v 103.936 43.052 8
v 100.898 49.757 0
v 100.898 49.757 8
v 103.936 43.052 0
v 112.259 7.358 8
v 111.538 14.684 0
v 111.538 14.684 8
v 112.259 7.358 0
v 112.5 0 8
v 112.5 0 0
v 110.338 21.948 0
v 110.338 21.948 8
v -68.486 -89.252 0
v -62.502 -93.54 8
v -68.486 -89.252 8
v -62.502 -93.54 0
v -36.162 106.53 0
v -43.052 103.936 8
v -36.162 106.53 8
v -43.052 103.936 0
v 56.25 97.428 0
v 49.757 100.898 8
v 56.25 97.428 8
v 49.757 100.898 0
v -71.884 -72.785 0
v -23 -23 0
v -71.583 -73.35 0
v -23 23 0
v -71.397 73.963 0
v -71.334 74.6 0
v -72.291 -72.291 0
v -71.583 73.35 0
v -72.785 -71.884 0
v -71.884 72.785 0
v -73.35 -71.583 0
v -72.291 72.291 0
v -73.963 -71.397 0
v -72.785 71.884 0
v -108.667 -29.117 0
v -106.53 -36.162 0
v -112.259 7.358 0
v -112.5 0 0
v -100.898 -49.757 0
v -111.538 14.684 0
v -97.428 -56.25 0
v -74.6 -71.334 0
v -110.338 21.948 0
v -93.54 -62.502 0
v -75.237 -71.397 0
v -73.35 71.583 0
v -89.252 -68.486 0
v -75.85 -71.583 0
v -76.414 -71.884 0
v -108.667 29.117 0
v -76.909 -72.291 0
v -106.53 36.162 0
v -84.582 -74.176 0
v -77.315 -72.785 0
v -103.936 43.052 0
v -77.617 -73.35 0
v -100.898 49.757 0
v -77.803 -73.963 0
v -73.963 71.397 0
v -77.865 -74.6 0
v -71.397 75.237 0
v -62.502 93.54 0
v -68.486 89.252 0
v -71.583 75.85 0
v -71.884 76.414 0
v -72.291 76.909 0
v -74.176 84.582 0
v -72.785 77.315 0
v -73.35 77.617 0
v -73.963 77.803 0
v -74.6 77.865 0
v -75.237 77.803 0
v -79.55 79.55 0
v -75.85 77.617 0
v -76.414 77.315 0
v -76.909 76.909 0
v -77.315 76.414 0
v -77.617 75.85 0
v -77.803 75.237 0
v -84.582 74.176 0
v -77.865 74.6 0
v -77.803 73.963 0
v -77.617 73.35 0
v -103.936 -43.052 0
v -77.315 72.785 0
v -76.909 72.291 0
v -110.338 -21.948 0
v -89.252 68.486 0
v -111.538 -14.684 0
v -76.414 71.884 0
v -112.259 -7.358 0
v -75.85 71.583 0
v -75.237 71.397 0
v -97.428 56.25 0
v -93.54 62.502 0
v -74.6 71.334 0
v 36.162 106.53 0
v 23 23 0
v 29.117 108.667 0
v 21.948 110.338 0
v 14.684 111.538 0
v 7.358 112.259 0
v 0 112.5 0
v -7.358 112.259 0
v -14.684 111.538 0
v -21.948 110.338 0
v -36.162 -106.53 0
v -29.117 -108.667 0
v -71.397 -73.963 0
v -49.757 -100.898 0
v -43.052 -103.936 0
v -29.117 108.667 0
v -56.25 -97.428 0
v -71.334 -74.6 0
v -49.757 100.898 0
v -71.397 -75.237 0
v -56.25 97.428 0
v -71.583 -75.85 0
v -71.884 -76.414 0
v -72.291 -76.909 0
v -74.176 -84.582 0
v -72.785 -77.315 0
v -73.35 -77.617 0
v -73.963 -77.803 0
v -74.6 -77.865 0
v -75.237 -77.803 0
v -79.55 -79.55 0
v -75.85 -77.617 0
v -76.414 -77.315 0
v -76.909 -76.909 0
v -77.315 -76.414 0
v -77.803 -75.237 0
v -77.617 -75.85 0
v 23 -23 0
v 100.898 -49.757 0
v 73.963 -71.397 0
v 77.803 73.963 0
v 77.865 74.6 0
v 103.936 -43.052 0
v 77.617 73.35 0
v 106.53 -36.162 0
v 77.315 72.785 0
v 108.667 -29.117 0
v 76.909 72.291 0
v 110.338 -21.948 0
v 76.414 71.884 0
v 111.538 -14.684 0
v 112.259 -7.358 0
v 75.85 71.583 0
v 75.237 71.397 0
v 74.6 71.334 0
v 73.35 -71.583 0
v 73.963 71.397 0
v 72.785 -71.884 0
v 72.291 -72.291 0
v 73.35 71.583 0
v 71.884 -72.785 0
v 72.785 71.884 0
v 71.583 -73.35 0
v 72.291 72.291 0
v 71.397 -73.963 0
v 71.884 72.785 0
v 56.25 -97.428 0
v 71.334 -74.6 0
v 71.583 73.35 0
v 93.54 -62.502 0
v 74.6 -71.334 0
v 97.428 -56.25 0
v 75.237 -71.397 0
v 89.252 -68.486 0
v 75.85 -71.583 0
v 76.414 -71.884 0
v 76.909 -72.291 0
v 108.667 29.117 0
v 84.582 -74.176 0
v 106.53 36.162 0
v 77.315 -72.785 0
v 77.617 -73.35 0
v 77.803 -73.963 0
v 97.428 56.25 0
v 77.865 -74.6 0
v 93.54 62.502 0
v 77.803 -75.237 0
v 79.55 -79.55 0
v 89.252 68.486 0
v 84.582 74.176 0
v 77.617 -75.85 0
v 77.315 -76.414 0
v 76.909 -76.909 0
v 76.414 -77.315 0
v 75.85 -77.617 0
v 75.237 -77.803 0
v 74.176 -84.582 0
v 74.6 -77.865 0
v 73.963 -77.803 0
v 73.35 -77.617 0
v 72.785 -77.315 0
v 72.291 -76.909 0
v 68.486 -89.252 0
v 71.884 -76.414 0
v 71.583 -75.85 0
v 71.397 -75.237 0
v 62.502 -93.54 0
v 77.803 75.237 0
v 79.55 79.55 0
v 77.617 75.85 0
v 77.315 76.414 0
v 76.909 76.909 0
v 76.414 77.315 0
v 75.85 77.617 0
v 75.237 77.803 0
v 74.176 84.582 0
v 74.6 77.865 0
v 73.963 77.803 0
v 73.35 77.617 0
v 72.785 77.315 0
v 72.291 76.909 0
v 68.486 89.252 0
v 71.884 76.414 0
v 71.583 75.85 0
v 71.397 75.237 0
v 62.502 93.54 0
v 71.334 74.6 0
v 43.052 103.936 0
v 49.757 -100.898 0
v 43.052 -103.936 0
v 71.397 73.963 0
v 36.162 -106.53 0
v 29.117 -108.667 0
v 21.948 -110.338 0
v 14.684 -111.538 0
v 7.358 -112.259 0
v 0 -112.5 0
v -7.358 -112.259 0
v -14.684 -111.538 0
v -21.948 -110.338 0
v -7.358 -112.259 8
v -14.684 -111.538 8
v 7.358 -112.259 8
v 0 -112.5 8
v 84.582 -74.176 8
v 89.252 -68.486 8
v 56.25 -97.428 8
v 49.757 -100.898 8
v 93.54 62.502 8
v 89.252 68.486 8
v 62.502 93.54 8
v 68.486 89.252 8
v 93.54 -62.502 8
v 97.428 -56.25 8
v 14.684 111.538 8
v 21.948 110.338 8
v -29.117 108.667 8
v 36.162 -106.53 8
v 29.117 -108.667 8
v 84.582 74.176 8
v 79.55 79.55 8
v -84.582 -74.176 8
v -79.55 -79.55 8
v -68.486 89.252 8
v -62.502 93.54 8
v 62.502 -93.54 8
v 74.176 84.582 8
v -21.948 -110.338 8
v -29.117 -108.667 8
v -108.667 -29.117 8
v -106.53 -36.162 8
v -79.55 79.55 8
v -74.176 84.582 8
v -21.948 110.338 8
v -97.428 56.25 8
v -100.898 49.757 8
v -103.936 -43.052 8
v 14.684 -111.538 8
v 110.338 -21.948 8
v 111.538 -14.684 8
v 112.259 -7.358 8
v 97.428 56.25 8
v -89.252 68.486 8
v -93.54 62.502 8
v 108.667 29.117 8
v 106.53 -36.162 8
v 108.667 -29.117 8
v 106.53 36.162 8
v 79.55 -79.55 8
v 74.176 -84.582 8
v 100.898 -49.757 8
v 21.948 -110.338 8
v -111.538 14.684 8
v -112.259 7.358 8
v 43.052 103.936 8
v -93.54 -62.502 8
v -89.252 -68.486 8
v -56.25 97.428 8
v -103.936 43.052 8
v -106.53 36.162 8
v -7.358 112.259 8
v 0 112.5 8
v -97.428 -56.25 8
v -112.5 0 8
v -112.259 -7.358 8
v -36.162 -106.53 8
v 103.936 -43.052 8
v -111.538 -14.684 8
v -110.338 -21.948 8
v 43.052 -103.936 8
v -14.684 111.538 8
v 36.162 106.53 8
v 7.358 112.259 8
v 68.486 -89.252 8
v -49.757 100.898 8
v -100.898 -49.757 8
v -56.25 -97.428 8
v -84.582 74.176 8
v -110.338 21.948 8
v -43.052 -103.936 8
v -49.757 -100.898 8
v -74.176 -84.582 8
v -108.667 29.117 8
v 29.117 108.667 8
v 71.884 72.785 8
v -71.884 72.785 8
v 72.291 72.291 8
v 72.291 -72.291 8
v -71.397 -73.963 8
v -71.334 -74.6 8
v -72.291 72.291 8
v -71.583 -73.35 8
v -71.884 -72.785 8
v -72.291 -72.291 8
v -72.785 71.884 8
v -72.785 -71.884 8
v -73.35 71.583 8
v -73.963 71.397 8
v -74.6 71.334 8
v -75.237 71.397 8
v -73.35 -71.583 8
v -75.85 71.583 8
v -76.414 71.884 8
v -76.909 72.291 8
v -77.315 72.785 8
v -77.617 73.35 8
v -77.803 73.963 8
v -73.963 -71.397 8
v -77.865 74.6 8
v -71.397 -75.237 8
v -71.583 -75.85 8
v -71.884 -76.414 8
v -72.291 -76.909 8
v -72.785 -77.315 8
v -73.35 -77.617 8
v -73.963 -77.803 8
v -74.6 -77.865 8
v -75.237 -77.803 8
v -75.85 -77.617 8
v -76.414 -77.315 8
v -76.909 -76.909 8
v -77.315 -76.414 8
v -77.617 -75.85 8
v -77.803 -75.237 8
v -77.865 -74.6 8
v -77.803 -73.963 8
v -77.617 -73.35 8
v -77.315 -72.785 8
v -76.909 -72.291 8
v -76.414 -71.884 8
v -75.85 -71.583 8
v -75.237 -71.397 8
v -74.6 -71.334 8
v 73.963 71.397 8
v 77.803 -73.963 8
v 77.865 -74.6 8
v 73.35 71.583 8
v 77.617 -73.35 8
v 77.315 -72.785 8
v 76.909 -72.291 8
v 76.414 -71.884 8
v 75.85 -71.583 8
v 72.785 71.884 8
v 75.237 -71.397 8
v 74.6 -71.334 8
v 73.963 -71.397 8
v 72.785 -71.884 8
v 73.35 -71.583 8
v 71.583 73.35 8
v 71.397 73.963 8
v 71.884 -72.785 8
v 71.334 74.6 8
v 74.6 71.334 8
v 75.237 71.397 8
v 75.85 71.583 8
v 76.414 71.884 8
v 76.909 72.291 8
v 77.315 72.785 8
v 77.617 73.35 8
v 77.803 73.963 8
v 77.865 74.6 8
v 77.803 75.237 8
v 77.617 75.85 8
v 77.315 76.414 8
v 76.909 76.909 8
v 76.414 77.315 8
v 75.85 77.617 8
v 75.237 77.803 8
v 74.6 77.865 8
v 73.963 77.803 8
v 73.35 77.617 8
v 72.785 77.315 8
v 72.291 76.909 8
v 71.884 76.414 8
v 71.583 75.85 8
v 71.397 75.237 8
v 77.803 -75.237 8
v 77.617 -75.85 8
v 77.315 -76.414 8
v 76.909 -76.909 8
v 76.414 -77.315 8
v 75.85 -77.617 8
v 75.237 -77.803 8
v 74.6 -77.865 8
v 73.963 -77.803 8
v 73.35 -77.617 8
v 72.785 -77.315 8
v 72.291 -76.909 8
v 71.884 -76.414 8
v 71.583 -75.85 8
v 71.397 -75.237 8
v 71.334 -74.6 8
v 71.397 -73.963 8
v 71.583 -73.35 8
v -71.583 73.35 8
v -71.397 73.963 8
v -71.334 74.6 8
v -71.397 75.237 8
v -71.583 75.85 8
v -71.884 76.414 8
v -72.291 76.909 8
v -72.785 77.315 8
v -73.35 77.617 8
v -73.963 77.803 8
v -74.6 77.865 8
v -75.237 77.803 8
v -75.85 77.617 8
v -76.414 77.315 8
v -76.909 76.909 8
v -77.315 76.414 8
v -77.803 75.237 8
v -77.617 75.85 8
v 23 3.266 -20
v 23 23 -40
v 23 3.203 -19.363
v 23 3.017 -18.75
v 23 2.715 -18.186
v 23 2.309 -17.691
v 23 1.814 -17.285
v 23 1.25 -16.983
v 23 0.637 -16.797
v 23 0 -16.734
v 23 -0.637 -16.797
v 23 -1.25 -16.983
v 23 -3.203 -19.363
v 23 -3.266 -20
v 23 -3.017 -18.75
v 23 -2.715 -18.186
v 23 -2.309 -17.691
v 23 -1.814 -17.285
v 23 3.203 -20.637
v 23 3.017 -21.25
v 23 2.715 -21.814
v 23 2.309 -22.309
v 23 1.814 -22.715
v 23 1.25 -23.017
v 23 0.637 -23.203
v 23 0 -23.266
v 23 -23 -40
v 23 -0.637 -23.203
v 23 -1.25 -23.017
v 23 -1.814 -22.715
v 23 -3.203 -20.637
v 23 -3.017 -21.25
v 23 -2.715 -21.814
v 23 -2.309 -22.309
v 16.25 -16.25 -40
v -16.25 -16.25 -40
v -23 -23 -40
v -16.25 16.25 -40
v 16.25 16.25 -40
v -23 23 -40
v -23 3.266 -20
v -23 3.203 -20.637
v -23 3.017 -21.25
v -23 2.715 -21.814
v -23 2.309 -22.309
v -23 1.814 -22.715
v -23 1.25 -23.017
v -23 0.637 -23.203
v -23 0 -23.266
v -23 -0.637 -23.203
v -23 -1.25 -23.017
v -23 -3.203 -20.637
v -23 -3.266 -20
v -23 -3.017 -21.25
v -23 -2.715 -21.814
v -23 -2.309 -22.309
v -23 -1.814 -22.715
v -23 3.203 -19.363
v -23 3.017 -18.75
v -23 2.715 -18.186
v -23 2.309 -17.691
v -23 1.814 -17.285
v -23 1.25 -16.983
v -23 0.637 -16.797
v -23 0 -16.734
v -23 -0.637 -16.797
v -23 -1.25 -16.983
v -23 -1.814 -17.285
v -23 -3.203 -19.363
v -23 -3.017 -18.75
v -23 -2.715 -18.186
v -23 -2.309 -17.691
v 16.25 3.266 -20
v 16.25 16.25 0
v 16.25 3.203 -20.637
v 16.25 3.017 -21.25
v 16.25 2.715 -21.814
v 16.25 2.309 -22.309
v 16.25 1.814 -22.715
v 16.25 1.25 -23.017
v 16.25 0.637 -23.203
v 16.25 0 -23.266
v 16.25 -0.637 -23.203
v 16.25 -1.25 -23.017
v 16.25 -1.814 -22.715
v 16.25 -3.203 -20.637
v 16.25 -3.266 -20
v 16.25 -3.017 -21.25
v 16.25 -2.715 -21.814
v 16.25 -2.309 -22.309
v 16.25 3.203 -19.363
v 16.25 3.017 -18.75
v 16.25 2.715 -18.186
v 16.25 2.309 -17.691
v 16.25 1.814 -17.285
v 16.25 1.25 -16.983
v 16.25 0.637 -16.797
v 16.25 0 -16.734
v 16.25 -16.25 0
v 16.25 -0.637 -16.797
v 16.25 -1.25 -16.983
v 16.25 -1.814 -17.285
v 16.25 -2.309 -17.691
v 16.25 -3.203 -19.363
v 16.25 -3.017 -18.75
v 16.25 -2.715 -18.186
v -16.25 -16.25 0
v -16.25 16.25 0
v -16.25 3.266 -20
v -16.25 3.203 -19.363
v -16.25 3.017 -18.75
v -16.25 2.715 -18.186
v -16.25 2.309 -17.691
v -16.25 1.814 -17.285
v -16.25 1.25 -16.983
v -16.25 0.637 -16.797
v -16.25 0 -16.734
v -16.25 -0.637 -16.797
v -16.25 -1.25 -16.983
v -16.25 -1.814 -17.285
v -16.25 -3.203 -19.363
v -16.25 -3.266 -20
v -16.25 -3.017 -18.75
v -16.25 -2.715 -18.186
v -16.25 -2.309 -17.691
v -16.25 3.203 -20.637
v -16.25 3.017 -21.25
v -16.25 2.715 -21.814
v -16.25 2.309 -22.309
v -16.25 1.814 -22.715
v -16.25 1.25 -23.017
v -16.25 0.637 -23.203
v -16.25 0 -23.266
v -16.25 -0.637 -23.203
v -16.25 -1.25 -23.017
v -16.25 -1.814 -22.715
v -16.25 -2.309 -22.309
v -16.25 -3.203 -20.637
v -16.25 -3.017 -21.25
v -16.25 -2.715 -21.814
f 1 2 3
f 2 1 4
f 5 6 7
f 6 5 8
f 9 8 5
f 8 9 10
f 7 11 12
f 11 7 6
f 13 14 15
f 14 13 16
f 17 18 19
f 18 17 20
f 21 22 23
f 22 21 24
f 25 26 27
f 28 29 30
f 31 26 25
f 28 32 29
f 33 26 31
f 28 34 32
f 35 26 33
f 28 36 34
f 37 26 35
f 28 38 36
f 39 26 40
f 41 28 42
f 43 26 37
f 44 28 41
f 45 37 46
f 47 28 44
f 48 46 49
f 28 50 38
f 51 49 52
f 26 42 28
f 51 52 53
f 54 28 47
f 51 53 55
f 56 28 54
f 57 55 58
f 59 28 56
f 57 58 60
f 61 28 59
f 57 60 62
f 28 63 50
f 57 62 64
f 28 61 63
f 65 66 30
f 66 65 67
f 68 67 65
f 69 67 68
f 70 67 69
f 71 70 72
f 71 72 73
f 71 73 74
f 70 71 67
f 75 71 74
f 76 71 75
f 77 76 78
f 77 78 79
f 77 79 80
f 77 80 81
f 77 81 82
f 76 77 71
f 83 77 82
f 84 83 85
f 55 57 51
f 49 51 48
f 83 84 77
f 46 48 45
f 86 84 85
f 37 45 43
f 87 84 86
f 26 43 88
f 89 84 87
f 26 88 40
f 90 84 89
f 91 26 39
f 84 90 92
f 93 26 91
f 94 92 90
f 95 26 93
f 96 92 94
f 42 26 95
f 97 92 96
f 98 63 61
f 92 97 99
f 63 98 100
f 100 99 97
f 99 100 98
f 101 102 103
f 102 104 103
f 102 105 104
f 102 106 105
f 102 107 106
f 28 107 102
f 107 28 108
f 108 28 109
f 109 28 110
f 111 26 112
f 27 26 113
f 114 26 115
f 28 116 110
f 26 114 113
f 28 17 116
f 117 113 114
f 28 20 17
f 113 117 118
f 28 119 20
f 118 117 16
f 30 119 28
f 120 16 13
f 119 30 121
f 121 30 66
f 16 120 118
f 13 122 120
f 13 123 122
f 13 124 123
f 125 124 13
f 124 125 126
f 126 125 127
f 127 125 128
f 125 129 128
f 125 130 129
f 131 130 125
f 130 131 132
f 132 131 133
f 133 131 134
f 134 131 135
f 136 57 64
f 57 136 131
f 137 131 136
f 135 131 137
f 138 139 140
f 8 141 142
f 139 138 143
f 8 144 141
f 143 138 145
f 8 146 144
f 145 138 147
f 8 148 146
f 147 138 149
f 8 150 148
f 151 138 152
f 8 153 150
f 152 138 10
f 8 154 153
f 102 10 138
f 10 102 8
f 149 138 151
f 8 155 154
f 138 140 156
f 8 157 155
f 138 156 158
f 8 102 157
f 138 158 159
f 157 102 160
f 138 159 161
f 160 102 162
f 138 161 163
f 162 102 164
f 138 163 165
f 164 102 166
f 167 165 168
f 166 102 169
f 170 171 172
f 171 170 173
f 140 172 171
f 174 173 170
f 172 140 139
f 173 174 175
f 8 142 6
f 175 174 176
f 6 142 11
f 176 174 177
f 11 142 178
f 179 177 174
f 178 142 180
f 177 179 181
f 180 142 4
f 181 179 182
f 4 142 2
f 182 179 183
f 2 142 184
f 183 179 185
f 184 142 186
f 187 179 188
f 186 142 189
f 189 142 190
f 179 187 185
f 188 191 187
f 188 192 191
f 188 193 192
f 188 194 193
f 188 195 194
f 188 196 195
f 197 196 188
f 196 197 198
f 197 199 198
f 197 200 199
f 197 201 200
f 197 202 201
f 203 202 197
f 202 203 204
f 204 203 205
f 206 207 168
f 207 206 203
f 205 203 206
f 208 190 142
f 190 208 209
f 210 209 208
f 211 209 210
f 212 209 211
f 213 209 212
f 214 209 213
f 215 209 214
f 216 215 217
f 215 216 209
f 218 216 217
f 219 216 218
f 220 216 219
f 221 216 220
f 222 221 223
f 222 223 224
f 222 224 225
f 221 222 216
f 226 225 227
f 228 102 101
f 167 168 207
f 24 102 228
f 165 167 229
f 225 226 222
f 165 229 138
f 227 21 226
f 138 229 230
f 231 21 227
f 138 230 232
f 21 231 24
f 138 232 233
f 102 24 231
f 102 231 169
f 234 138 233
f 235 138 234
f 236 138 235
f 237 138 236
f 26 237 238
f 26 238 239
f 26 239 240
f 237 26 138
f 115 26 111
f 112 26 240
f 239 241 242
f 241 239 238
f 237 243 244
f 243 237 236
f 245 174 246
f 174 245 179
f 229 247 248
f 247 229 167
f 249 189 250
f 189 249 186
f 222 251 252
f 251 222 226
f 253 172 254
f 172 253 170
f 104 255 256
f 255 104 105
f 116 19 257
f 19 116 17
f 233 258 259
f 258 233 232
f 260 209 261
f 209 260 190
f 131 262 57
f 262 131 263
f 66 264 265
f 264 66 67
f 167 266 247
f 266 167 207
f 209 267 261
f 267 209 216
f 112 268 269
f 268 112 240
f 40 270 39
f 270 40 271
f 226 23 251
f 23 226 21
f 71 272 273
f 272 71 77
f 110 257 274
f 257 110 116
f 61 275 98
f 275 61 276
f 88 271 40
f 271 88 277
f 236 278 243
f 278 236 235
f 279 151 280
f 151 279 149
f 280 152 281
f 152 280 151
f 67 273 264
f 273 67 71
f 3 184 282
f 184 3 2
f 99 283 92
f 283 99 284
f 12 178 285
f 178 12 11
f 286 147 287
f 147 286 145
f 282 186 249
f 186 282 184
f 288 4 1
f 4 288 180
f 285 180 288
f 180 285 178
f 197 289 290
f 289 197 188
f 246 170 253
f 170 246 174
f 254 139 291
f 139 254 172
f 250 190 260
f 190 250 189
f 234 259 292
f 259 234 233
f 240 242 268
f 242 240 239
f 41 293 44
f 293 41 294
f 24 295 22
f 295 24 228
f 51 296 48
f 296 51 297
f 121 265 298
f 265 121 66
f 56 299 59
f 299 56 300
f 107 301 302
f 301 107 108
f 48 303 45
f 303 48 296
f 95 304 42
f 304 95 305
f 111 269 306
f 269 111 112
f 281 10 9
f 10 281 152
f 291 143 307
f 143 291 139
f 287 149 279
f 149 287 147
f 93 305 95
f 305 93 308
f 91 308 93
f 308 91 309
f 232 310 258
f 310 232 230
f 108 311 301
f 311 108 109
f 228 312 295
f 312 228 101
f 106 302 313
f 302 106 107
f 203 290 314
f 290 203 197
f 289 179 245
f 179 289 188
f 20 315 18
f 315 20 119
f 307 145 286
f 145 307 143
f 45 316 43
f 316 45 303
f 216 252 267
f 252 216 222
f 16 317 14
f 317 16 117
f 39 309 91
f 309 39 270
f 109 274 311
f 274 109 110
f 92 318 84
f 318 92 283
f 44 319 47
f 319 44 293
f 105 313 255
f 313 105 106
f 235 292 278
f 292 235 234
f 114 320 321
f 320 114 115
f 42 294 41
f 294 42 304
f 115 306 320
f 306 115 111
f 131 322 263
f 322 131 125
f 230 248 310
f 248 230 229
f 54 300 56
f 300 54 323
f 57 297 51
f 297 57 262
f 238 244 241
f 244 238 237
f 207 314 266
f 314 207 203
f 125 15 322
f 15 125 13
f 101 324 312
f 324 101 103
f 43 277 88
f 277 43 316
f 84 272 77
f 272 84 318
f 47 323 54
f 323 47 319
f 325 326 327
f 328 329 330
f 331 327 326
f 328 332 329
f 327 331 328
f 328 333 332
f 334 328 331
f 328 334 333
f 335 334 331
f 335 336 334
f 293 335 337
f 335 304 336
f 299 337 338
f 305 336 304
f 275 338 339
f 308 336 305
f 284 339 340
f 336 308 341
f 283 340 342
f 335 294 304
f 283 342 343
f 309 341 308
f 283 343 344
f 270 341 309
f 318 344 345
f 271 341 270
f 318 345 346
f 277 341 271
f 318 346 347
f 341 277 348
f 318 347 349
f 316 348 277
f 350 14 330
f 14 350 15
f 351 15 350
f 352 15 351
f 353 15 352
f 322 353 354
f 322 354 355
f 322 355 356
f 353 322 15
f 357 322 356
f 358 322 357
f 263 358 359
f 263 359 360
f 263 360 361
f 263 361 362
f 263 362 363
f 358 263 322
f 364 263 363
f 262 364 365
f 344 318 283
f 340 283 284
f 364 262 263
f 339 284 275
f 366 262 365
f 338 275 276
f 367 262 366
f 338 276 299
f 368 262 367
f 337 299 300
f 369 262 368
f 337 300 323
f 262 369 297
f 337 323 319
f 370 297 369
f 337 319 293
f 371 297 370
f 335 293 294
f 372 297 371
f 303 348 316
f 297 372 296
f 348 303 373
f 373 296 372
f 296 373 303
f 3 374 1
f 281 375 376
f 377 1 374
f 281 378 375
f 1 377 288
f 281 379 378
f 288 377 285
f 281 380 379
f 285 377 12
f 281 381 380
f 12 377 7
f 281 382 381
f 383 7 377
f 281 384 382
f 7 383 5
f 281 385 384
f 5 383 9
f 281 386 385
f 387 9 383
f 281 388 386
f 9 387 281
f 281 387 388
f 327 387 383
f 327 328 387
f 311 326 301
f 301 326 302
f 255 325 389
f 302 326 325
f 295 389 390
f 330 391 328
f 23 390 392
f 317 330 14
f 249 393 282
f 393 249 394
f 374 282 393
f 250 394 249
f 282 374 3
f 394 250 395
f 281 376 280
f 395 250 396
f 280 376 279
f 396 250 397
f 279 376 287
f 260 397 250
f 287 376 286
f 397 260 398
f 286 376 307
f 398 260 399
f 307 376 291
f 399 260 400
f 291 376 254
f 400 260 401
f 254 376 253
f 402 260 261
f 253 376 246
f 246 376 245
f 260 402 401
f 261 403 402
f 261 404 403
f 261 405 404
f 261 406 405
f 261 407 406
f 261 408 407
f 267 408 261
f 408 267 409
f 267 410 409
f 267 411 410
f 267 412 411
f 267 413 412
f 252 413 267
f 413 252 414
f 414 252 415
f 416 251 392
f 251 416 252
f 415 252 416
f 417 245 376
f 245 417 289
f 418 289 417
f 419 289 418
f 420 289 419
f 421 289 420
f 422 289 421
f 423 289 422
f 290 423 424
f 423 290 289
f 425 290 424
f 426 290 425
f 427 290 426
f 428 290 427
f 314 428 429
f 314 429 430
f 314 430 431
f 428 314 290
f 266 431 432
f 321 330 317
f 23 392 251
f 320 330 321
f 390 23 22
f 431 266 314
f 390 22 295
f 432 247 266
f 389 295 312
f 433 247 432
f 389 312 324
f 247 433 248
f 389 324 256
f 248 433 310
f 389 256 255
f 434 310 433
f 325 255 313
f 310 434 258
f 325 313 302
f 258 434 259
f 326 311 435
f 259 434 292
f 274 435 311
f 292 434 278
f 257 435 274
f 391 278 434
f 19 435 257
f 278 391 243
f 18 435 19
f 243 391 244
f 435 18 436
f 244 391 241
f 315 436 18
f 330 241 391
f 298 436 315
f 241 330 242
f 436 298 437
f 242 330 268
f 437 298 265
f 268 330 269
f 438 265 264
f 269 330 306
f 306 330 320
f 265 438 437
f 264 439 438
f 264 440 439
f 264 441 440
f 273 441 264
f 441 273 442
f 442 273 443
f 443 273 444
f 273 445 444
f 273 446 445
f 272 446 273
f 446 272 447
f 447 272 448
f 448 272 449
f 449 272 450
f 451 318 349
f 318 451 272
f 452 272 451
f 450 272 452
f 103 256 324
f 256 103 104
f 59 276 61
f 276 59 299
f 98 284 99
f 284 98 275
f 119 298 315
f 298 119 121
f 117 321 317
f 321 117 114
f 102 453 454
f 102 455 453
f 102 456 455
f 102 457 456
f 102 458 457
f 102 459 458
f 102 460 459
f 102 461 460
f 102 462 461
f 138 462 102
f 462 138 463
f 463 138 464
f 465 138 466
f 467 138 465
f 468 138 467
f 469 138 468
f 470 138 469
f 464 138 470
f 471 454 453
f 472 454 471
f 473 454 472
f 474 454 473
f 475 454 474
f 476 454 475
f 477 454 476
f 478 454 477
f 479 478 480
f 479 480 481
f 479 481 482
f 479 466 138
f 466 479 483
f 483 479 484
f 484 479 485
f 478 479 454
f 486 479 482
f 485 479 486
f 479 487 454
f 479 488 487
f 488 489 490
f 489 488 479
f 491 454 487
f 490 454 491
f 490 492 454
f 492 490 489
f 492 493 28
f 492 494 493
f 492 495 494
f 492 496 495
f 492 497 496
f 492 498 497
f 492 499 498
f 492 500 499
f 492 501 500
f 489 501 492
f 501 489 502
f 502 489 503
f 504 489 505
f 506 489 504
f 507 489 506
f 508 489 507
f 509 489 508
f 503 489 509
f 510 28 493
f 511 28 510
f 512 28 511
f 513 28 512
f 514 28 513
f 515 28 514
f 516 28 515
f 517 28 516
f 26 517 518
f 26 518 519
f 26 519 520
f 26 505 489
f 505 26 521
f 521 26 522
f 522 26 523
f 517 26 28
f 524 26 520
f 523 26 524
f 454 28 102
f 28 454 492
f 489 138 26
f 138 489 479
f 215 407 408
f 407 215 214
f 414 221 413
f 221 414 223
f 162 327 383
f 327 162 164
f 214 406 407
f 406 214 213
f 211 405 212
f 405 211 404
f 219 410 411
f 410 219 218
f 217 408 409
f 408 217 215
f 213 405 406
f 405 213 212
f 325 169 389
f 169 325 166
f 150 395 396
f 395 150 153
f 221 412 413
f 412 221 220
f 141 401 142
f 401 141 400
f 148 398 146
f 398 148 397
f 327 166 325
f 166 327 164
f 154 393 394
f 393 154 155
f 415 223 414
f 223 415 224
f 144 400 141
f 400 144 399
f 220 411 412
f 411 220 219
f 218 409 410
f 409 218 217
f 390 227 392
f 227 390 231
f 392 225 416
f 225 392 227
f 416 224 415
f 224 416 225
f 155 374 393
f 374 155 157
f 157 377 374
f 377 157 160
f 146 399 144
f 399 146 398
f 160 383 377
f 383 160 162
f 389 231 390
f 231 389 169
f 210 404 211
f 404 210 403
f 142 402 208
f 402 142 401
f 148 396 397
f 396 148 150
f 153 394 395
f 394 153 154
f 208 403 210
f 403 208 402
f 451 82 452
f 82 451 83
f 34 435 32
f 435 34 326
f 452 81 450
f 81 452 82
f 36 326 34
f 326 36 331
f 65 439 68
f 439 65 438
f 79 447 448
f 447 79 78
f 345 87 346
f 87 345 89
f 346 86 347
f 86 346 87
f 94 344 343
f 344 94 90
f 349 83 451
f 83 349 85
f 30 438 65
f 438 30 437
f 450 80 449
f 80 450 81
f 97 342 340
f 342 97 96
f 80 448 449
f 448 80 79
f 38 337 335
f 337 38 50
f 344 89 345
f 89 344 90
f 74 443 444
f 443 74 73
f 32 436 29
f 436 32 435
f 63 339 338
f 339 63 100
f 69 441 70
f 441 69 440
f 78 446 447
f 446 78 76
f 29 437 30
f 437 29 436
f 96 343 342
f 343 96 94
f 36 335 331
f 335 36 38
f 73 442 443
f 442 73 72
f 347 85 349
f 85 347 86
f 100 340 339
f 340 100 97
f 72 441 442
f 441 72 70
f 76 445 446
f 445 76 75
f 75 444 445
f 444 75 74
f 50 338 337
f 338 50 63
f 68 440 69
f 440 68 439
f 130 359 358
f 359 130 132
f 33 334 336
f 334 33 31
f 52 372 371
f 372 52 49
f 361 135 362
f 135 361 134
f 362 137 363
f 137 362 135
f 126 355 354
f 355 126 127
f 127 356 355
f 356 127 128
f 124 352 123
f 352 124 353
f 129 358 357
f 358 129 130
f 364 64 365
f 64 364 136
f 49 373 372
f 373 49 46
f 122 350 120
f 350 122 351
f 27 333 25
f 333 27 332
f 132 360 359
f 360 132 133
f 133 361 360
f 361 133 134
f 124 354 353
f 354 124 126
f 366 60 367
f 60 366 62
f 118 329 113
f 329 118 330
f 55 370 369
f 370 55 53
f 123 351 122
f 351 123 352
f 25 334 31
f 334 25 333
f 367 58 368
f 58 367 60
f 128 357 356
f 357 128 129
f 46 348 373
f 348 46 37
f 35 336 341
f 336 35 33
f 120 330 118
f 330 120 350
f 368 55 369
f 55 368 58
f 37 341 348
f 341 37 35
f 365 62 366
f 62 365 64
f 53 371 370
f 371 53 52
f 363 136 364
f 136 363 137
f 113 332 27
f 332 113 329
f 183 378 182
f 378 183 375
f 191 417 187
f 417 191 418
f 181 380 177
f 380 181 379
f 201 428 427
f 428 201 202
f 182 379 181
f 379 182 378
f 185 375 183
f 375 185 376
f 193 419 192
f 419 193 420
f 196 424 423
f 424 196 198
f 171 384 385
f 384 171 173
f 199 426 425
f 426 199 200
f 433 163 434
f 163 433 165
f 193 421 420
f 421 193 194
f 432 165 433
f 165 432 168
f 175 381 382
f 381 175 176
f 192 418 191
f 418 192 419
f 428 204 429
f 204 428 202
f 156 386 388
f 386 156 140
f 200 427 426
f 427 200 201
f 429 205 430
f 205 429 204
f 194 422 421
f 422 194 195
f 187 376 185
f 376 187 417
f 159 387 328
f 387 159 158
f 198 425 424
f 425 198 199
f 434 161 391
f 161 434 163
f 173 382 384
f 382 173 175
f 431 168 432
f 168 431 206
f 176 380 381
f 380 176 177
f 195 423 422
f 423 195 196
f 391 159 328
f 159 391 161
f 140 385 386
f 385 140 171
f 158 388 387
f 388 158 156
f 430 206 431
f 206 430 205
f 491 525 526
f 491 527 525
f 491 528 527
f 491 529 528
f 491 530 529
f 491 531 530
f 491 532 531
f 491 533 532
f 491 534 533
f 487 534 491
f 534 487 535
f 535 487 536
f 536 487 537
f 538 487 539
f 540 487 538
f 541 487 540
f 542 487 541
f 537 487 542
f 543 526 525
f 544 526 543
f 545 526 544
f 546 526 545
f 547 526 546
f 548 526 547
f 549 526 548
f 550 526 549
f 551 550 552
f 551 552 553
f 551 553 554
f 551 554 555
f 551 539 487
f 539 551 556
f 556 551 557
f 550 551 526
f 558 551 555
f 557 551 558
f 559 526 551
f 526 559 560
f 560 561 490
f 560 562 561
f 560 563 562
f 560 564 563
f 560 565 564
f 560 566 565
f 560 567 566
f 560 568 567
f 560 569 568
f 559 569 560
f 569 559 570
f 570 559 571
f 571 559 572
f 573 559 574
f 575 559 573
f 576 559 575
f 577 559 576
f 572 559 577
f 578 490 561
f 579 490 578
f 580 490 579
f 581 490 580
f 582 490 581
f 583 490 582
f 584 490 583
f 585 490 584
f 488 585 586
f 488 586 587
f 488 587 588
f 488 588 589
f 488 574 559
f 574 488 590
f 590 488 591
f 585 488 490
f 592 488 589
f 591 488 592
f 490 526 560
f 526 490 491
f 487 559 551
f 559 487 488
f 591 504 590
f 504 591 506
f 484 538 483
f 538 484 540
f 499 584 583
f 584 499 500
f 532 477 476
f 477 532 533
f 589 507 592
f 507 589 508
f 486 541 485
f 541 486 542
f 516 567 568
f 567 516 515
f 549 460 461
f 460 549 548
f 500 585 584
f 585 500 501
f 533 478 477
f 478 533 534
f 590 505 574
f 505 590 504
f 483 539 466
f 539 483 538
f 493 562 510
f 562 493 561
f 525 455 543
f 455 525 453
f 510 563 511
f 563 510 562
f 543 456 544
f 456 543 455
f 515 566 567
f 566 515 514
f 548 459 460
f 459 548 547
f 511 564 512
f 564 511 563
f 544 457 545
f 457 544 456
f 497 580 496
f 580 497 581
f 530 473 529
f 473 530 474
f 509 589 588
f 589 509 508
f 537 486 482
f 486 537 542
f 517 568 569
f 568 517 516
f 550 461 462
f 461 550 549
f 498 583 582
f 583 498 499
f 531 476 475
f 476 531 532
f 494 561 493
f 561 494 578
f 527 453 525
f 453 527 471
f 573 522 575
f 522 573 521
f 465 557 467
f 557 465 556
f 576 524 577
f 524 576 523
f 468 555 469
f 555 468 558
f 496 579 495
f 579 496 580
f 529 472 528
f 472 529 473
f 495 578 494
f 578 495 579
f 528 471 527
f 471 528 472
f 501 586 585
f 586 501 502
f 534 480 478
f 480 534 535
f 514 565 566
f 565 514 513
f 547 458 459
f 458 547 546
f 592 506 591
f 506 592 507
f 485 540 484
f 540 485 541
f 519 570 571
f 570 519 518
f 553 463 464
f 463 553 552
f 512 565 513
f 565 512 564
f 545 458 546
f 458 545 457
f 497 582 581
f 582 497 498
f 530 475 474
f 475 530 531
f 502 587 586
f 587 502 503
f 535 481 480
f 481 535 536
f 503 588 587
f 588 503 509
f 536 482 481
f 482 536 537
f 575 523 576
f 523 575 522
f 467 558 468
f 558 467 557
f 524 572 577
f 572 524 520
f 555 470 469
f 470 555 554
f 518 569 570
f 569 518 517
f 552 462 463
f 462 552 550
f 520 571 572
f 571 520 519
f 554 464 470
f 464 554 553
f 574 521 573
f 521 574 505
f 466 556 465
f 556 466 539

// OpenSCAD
// file: ../../../../../scad/lib/parent_spar_bolted.scad
// Parent modular exterior v2. mm. Geometry shared by individual part wrappers.
// Metal fasteners, ballast, Takachi box and electronics are purchased items.
/* [Dimensions] */
disk_d=225; disk_t=5;
fin_h=125; fin_w=65; fin_t=4;
beam_w=32; clearance=0.5;
float_r=100; flange_r=112.5; float_bore_r=30;
float_wall=4; float_h=180; lid_t=6;
rod_r=105.5; flange_t=6;
hub_h=32; root_x=30; root_depth=14;
$fn=96; e=0.03;
assert(disk_d<=225 && 2*flange_r<=225);
assert(fin_h>=100 && fin_h<=150 && fin_w>=50 && fin_w<=80);
assert(root_x+fin_w<disk_d/2-5);
module bore(d,h) { cylinder(d=d/cos(180/32),h=h,$fn=32); }
module bore_x(d,l) { rotate([0,90,0]) bore(d,l); }
module bore_y(d,l) { rotate([-90,0,0]) bore(d,l); }
module square_bore(h) { translate([-(beam_w+clearance)/2,-(beam_w+clearance)/2,-e]) cube([beam_w+clearance,beam_w+clearance,h+2*e]); }
module rods(h,d=6.5) { for(a=[45:90:315]) rotate([0,0,a]) translate([rod_r,0,-e]) bore(d,h+2*e); }
module lid_bolts(h) { for(a=[22.5:45:359]) rotate([0,0,a]) translate([rod_r,0,-e]) bore(4.5,h+2*e); }
module hub_pin(z) { translate([-46,10,z]) bore_x(6.5,92); }
module disk() {
 difference() { cylinder(d=disk_d,h=disk_t); square_bore(disk_t);
  for(x=[-23,23],y=[-23,23]) translate([x,y,-e]) bore(5.5,disk_t+2*e);
 }
}
module fin() {
 difference() { cube([fin_w,fin_t,fin_h]);
  for(z=[10,fin_h-hub_h+10]) translate([root_depth/2,-e,z]) bore_y(5.5,fin_t+2*e);
 }
}
module hub() {
 difference() {
  union() { translate([-30,-30,0]) cube([60,60,hub_h]);
   for(a=[0:90:270]) rotate([0,0,a]) translate([28,-16,0]) cube([16,32,hub_h]);
  }
  square_bore(hub_h);
  for(a=[0:90:270]) rotate([0,0,a]) {
   translate([root_x-clearance/2,-(fin_t+clearance)/2,-e]) cube([root_depth+clearance,fin_t+clearance,hub_h+2*e]);
   translate([root_x+root_depth/2,-17,10]) bore_y(5.5,34);
  }
  for(x=[-23,23],y=[-23,23]) translate([x,y,-e]) bore(5.5,hub_h+2*e);
  hub_pin(24);
 }
}
module beam(lower=true) {
 len=lower?180:107;
 difference() { translate([-beam_w/2,-beam_w/2,0]) cube([beam_w,beam_w,len]);
  if(lower) { for(z=[24,117]) hub_pin(z); translate([-20,0,160]) bore_x(6.5,40); translate([0,0,-e]) bore(16,8); }
  else for(z=[20,87]) translate([-20,0,z]) bore_x(6.5,40);
 }
}
module coupler() {
 // One half of a screwed split coupler. Mirror Y for the second half.
 difference() { translate([-27,0.25,0]) cube([54,26.75,64]); square_bore(64);
  for(z=[12,52]) translate([-28,0,z]) bore_x(6.5,56);
  for(x=[-22,22],z=[24,40]) translate([x,-1,z]) bore_y(5.5,29);
 }
}
module float_body() {
 difference() {
  union() { cylinder(r=float_r,h=float_h);
   translate([0,0,float_h-flange_t]) cylinder(r=flange_r,h=flange_t);
   // 45-degree underside of the flange instead of a 15 mm unsupported ledge.
   translate([0,0,float_h-flange_t-(flange_r-float_r)]) cylinder(r1=float_r,r2=flange_r,h=flange_r-float_r);
  }
  translate([0,0,-e]) cylinder(r=float_bore_r,h=float_h+2*e);
  translate([0,0,float_wall]) difference() {
   cylinder(r=float_r-float_wall,h=float_h);
   cylinder(r=float_bore_r+float_wall,h=float_h+e);
  }
  // Coupling-nut clearance; nearest cavity wall remains >=3 mm thick.
  rods(float_h,13); lid_bolts(float_h);
  for(a=[22.5:45:359]) rotate([0,0,a]) translate([rod_r,0,-e]) bore(10,float_h-flange_t+e);
 }
}
module float_lid() {
 difference() {
  cylinder(r=flange_r,h=lid_t);
  translate([0,0,-e]) cylinder(r=float_bore_r,h=lid_t+2*e);
  rods(lid_t,13); lid_bolts(lid_t);
  // Continuous face seals: 2 mm cord, 2.4 wide x 1.5 deep grooves.
  for(r=[float_bore_r+float_wall/2,float_r-float_wall/2]) translate([0,0,-e]) difference() {
   cylinder(r=r+1.2,h=1.5+e); cylinder(r=r-1.2,h=1.5+2*e);
  }
 }
}
module float_end(top=true) {
 difference() {
  union() { cylinder(r=flange_r,h=8);
   if(top) translate([-30,-30,8-e]) cube([60,60,20+e]);
   else translate([-23,-23,-40]) cube([46,46,40+e]);
  }
  rods(8);
  if(top) for(x=[-20,20],y=[-20,20]) {
   translate([x,y,-e]) bore(5.5,29);
   translate([x,y,-e]) bore(11,18+e);
  }
  if(top) for(a=[22.5:45:359]) rotate([0,0,a]) translate([rod_r,0,-e]) bore(12,8+2*e);
  else { translate([0,0,-40]) square_bore(40-e);
   translate([-24,0,-20]) bore_x(6.5,48);
  }
 }
}
module ballast_body() {
 // Open upward in print orientation. In the assembly this cup is inverted.
 difference() {
  union() { cylinder(r=45,h=51); translate([0,0,45]) cylinder(r=60,h=6);
   translate([0,0,30]) cylinder(r1=45,r2=60,h=15);
  }
  translate([0,0,6]) cylinder(r=40,h=46);
  for(x=[-23,23],y=[-23,23]) translate([x,y,-e]) bore(5.5,7);
  translate([0,0,-e]) bore(8.5,7);
  for(a=[0:90:270]) rotate([0,0,a]) translate([52,0,29]) { bore(5.5,23); bore(12,16); }
 }
}
module ballast_lid() {
 difference() { cylinder(r=60,h=6);
  for(a=[0:90:270]) rotate([0,0,a]) translate([52,0,-e]) bore(5.5,7);
  // Flooded ballast compartment: drainage, no trapped air assumption.
  for(x=[-20,0,20]) translate([x,0,-e]) bore(6,7);
 }
}
module camera_bridge() {
 // Assembly frame: local top z=78; camera seat z=8. +Y faces camera front.
 difference() {
  union() {
   translate([-30,45,70]) cube([60,90,8]);
   translate([-70,125,0]) cube([140,100,8]);
   translate([-70,125,0]) cube([140,10,78]);
   for(x=[-64,56]) translate([x,0,0]) rotate([90,0,90]) linear_extrude(8)
    polygon([[135,8],[215,8],[135,70]]);
  }
  for(x=[-20,20],y=[50,90]) translate([x,y,69]) bore(5.5,10);
  for(x=[-11,11],y=[174,206]) translate([x,y,-e]) bore(5.5,10);
 }
}
module gps_bridge() {
 // Local attachment face X=0 at deck +X; top shelf z=175.
 difference() {
  union() { translate([0,-25,0]) cube([10,50,183]);
   translate([-90,-48,175]) cube([100,96,8]);
   for(y=[-17,25]) translate([0,y,0]) rotate([90,0,0]) linear_extrude(8)
    polygon([[e,155],[e,175+e],[-80,175+e]]);
  }
  for(y=[-20,20],z=[5,45]) translate([-e,y,z]) bore_x(5.5,11);
  for(y=[-34,34]) translate([-43,y,174]) bore(4.5,10);
 }
}
// Reference antenna envelope, correct mounting ears, not a printable antenna.
module gps_reference() {
 difference() {
  union() { translate([-30,-28,0]) cube([60,56,22.5]);
   translate([-10,-41,0]) cube([20,82,6]); }
  for(y=[-34,34]) translate([0,y,-e]) bore(4.5,7);
 }
}
// main file
// mm. part=print is the intended X1C orientation.
part="assembly"; // [assembly,print]
use <../../../../../scad/lib/parent_spar_bolted.scad>
if(part=="print") { translate([0,0,8]) rotate([180,0,0]) float_end(false); } else { float_end(false); }
